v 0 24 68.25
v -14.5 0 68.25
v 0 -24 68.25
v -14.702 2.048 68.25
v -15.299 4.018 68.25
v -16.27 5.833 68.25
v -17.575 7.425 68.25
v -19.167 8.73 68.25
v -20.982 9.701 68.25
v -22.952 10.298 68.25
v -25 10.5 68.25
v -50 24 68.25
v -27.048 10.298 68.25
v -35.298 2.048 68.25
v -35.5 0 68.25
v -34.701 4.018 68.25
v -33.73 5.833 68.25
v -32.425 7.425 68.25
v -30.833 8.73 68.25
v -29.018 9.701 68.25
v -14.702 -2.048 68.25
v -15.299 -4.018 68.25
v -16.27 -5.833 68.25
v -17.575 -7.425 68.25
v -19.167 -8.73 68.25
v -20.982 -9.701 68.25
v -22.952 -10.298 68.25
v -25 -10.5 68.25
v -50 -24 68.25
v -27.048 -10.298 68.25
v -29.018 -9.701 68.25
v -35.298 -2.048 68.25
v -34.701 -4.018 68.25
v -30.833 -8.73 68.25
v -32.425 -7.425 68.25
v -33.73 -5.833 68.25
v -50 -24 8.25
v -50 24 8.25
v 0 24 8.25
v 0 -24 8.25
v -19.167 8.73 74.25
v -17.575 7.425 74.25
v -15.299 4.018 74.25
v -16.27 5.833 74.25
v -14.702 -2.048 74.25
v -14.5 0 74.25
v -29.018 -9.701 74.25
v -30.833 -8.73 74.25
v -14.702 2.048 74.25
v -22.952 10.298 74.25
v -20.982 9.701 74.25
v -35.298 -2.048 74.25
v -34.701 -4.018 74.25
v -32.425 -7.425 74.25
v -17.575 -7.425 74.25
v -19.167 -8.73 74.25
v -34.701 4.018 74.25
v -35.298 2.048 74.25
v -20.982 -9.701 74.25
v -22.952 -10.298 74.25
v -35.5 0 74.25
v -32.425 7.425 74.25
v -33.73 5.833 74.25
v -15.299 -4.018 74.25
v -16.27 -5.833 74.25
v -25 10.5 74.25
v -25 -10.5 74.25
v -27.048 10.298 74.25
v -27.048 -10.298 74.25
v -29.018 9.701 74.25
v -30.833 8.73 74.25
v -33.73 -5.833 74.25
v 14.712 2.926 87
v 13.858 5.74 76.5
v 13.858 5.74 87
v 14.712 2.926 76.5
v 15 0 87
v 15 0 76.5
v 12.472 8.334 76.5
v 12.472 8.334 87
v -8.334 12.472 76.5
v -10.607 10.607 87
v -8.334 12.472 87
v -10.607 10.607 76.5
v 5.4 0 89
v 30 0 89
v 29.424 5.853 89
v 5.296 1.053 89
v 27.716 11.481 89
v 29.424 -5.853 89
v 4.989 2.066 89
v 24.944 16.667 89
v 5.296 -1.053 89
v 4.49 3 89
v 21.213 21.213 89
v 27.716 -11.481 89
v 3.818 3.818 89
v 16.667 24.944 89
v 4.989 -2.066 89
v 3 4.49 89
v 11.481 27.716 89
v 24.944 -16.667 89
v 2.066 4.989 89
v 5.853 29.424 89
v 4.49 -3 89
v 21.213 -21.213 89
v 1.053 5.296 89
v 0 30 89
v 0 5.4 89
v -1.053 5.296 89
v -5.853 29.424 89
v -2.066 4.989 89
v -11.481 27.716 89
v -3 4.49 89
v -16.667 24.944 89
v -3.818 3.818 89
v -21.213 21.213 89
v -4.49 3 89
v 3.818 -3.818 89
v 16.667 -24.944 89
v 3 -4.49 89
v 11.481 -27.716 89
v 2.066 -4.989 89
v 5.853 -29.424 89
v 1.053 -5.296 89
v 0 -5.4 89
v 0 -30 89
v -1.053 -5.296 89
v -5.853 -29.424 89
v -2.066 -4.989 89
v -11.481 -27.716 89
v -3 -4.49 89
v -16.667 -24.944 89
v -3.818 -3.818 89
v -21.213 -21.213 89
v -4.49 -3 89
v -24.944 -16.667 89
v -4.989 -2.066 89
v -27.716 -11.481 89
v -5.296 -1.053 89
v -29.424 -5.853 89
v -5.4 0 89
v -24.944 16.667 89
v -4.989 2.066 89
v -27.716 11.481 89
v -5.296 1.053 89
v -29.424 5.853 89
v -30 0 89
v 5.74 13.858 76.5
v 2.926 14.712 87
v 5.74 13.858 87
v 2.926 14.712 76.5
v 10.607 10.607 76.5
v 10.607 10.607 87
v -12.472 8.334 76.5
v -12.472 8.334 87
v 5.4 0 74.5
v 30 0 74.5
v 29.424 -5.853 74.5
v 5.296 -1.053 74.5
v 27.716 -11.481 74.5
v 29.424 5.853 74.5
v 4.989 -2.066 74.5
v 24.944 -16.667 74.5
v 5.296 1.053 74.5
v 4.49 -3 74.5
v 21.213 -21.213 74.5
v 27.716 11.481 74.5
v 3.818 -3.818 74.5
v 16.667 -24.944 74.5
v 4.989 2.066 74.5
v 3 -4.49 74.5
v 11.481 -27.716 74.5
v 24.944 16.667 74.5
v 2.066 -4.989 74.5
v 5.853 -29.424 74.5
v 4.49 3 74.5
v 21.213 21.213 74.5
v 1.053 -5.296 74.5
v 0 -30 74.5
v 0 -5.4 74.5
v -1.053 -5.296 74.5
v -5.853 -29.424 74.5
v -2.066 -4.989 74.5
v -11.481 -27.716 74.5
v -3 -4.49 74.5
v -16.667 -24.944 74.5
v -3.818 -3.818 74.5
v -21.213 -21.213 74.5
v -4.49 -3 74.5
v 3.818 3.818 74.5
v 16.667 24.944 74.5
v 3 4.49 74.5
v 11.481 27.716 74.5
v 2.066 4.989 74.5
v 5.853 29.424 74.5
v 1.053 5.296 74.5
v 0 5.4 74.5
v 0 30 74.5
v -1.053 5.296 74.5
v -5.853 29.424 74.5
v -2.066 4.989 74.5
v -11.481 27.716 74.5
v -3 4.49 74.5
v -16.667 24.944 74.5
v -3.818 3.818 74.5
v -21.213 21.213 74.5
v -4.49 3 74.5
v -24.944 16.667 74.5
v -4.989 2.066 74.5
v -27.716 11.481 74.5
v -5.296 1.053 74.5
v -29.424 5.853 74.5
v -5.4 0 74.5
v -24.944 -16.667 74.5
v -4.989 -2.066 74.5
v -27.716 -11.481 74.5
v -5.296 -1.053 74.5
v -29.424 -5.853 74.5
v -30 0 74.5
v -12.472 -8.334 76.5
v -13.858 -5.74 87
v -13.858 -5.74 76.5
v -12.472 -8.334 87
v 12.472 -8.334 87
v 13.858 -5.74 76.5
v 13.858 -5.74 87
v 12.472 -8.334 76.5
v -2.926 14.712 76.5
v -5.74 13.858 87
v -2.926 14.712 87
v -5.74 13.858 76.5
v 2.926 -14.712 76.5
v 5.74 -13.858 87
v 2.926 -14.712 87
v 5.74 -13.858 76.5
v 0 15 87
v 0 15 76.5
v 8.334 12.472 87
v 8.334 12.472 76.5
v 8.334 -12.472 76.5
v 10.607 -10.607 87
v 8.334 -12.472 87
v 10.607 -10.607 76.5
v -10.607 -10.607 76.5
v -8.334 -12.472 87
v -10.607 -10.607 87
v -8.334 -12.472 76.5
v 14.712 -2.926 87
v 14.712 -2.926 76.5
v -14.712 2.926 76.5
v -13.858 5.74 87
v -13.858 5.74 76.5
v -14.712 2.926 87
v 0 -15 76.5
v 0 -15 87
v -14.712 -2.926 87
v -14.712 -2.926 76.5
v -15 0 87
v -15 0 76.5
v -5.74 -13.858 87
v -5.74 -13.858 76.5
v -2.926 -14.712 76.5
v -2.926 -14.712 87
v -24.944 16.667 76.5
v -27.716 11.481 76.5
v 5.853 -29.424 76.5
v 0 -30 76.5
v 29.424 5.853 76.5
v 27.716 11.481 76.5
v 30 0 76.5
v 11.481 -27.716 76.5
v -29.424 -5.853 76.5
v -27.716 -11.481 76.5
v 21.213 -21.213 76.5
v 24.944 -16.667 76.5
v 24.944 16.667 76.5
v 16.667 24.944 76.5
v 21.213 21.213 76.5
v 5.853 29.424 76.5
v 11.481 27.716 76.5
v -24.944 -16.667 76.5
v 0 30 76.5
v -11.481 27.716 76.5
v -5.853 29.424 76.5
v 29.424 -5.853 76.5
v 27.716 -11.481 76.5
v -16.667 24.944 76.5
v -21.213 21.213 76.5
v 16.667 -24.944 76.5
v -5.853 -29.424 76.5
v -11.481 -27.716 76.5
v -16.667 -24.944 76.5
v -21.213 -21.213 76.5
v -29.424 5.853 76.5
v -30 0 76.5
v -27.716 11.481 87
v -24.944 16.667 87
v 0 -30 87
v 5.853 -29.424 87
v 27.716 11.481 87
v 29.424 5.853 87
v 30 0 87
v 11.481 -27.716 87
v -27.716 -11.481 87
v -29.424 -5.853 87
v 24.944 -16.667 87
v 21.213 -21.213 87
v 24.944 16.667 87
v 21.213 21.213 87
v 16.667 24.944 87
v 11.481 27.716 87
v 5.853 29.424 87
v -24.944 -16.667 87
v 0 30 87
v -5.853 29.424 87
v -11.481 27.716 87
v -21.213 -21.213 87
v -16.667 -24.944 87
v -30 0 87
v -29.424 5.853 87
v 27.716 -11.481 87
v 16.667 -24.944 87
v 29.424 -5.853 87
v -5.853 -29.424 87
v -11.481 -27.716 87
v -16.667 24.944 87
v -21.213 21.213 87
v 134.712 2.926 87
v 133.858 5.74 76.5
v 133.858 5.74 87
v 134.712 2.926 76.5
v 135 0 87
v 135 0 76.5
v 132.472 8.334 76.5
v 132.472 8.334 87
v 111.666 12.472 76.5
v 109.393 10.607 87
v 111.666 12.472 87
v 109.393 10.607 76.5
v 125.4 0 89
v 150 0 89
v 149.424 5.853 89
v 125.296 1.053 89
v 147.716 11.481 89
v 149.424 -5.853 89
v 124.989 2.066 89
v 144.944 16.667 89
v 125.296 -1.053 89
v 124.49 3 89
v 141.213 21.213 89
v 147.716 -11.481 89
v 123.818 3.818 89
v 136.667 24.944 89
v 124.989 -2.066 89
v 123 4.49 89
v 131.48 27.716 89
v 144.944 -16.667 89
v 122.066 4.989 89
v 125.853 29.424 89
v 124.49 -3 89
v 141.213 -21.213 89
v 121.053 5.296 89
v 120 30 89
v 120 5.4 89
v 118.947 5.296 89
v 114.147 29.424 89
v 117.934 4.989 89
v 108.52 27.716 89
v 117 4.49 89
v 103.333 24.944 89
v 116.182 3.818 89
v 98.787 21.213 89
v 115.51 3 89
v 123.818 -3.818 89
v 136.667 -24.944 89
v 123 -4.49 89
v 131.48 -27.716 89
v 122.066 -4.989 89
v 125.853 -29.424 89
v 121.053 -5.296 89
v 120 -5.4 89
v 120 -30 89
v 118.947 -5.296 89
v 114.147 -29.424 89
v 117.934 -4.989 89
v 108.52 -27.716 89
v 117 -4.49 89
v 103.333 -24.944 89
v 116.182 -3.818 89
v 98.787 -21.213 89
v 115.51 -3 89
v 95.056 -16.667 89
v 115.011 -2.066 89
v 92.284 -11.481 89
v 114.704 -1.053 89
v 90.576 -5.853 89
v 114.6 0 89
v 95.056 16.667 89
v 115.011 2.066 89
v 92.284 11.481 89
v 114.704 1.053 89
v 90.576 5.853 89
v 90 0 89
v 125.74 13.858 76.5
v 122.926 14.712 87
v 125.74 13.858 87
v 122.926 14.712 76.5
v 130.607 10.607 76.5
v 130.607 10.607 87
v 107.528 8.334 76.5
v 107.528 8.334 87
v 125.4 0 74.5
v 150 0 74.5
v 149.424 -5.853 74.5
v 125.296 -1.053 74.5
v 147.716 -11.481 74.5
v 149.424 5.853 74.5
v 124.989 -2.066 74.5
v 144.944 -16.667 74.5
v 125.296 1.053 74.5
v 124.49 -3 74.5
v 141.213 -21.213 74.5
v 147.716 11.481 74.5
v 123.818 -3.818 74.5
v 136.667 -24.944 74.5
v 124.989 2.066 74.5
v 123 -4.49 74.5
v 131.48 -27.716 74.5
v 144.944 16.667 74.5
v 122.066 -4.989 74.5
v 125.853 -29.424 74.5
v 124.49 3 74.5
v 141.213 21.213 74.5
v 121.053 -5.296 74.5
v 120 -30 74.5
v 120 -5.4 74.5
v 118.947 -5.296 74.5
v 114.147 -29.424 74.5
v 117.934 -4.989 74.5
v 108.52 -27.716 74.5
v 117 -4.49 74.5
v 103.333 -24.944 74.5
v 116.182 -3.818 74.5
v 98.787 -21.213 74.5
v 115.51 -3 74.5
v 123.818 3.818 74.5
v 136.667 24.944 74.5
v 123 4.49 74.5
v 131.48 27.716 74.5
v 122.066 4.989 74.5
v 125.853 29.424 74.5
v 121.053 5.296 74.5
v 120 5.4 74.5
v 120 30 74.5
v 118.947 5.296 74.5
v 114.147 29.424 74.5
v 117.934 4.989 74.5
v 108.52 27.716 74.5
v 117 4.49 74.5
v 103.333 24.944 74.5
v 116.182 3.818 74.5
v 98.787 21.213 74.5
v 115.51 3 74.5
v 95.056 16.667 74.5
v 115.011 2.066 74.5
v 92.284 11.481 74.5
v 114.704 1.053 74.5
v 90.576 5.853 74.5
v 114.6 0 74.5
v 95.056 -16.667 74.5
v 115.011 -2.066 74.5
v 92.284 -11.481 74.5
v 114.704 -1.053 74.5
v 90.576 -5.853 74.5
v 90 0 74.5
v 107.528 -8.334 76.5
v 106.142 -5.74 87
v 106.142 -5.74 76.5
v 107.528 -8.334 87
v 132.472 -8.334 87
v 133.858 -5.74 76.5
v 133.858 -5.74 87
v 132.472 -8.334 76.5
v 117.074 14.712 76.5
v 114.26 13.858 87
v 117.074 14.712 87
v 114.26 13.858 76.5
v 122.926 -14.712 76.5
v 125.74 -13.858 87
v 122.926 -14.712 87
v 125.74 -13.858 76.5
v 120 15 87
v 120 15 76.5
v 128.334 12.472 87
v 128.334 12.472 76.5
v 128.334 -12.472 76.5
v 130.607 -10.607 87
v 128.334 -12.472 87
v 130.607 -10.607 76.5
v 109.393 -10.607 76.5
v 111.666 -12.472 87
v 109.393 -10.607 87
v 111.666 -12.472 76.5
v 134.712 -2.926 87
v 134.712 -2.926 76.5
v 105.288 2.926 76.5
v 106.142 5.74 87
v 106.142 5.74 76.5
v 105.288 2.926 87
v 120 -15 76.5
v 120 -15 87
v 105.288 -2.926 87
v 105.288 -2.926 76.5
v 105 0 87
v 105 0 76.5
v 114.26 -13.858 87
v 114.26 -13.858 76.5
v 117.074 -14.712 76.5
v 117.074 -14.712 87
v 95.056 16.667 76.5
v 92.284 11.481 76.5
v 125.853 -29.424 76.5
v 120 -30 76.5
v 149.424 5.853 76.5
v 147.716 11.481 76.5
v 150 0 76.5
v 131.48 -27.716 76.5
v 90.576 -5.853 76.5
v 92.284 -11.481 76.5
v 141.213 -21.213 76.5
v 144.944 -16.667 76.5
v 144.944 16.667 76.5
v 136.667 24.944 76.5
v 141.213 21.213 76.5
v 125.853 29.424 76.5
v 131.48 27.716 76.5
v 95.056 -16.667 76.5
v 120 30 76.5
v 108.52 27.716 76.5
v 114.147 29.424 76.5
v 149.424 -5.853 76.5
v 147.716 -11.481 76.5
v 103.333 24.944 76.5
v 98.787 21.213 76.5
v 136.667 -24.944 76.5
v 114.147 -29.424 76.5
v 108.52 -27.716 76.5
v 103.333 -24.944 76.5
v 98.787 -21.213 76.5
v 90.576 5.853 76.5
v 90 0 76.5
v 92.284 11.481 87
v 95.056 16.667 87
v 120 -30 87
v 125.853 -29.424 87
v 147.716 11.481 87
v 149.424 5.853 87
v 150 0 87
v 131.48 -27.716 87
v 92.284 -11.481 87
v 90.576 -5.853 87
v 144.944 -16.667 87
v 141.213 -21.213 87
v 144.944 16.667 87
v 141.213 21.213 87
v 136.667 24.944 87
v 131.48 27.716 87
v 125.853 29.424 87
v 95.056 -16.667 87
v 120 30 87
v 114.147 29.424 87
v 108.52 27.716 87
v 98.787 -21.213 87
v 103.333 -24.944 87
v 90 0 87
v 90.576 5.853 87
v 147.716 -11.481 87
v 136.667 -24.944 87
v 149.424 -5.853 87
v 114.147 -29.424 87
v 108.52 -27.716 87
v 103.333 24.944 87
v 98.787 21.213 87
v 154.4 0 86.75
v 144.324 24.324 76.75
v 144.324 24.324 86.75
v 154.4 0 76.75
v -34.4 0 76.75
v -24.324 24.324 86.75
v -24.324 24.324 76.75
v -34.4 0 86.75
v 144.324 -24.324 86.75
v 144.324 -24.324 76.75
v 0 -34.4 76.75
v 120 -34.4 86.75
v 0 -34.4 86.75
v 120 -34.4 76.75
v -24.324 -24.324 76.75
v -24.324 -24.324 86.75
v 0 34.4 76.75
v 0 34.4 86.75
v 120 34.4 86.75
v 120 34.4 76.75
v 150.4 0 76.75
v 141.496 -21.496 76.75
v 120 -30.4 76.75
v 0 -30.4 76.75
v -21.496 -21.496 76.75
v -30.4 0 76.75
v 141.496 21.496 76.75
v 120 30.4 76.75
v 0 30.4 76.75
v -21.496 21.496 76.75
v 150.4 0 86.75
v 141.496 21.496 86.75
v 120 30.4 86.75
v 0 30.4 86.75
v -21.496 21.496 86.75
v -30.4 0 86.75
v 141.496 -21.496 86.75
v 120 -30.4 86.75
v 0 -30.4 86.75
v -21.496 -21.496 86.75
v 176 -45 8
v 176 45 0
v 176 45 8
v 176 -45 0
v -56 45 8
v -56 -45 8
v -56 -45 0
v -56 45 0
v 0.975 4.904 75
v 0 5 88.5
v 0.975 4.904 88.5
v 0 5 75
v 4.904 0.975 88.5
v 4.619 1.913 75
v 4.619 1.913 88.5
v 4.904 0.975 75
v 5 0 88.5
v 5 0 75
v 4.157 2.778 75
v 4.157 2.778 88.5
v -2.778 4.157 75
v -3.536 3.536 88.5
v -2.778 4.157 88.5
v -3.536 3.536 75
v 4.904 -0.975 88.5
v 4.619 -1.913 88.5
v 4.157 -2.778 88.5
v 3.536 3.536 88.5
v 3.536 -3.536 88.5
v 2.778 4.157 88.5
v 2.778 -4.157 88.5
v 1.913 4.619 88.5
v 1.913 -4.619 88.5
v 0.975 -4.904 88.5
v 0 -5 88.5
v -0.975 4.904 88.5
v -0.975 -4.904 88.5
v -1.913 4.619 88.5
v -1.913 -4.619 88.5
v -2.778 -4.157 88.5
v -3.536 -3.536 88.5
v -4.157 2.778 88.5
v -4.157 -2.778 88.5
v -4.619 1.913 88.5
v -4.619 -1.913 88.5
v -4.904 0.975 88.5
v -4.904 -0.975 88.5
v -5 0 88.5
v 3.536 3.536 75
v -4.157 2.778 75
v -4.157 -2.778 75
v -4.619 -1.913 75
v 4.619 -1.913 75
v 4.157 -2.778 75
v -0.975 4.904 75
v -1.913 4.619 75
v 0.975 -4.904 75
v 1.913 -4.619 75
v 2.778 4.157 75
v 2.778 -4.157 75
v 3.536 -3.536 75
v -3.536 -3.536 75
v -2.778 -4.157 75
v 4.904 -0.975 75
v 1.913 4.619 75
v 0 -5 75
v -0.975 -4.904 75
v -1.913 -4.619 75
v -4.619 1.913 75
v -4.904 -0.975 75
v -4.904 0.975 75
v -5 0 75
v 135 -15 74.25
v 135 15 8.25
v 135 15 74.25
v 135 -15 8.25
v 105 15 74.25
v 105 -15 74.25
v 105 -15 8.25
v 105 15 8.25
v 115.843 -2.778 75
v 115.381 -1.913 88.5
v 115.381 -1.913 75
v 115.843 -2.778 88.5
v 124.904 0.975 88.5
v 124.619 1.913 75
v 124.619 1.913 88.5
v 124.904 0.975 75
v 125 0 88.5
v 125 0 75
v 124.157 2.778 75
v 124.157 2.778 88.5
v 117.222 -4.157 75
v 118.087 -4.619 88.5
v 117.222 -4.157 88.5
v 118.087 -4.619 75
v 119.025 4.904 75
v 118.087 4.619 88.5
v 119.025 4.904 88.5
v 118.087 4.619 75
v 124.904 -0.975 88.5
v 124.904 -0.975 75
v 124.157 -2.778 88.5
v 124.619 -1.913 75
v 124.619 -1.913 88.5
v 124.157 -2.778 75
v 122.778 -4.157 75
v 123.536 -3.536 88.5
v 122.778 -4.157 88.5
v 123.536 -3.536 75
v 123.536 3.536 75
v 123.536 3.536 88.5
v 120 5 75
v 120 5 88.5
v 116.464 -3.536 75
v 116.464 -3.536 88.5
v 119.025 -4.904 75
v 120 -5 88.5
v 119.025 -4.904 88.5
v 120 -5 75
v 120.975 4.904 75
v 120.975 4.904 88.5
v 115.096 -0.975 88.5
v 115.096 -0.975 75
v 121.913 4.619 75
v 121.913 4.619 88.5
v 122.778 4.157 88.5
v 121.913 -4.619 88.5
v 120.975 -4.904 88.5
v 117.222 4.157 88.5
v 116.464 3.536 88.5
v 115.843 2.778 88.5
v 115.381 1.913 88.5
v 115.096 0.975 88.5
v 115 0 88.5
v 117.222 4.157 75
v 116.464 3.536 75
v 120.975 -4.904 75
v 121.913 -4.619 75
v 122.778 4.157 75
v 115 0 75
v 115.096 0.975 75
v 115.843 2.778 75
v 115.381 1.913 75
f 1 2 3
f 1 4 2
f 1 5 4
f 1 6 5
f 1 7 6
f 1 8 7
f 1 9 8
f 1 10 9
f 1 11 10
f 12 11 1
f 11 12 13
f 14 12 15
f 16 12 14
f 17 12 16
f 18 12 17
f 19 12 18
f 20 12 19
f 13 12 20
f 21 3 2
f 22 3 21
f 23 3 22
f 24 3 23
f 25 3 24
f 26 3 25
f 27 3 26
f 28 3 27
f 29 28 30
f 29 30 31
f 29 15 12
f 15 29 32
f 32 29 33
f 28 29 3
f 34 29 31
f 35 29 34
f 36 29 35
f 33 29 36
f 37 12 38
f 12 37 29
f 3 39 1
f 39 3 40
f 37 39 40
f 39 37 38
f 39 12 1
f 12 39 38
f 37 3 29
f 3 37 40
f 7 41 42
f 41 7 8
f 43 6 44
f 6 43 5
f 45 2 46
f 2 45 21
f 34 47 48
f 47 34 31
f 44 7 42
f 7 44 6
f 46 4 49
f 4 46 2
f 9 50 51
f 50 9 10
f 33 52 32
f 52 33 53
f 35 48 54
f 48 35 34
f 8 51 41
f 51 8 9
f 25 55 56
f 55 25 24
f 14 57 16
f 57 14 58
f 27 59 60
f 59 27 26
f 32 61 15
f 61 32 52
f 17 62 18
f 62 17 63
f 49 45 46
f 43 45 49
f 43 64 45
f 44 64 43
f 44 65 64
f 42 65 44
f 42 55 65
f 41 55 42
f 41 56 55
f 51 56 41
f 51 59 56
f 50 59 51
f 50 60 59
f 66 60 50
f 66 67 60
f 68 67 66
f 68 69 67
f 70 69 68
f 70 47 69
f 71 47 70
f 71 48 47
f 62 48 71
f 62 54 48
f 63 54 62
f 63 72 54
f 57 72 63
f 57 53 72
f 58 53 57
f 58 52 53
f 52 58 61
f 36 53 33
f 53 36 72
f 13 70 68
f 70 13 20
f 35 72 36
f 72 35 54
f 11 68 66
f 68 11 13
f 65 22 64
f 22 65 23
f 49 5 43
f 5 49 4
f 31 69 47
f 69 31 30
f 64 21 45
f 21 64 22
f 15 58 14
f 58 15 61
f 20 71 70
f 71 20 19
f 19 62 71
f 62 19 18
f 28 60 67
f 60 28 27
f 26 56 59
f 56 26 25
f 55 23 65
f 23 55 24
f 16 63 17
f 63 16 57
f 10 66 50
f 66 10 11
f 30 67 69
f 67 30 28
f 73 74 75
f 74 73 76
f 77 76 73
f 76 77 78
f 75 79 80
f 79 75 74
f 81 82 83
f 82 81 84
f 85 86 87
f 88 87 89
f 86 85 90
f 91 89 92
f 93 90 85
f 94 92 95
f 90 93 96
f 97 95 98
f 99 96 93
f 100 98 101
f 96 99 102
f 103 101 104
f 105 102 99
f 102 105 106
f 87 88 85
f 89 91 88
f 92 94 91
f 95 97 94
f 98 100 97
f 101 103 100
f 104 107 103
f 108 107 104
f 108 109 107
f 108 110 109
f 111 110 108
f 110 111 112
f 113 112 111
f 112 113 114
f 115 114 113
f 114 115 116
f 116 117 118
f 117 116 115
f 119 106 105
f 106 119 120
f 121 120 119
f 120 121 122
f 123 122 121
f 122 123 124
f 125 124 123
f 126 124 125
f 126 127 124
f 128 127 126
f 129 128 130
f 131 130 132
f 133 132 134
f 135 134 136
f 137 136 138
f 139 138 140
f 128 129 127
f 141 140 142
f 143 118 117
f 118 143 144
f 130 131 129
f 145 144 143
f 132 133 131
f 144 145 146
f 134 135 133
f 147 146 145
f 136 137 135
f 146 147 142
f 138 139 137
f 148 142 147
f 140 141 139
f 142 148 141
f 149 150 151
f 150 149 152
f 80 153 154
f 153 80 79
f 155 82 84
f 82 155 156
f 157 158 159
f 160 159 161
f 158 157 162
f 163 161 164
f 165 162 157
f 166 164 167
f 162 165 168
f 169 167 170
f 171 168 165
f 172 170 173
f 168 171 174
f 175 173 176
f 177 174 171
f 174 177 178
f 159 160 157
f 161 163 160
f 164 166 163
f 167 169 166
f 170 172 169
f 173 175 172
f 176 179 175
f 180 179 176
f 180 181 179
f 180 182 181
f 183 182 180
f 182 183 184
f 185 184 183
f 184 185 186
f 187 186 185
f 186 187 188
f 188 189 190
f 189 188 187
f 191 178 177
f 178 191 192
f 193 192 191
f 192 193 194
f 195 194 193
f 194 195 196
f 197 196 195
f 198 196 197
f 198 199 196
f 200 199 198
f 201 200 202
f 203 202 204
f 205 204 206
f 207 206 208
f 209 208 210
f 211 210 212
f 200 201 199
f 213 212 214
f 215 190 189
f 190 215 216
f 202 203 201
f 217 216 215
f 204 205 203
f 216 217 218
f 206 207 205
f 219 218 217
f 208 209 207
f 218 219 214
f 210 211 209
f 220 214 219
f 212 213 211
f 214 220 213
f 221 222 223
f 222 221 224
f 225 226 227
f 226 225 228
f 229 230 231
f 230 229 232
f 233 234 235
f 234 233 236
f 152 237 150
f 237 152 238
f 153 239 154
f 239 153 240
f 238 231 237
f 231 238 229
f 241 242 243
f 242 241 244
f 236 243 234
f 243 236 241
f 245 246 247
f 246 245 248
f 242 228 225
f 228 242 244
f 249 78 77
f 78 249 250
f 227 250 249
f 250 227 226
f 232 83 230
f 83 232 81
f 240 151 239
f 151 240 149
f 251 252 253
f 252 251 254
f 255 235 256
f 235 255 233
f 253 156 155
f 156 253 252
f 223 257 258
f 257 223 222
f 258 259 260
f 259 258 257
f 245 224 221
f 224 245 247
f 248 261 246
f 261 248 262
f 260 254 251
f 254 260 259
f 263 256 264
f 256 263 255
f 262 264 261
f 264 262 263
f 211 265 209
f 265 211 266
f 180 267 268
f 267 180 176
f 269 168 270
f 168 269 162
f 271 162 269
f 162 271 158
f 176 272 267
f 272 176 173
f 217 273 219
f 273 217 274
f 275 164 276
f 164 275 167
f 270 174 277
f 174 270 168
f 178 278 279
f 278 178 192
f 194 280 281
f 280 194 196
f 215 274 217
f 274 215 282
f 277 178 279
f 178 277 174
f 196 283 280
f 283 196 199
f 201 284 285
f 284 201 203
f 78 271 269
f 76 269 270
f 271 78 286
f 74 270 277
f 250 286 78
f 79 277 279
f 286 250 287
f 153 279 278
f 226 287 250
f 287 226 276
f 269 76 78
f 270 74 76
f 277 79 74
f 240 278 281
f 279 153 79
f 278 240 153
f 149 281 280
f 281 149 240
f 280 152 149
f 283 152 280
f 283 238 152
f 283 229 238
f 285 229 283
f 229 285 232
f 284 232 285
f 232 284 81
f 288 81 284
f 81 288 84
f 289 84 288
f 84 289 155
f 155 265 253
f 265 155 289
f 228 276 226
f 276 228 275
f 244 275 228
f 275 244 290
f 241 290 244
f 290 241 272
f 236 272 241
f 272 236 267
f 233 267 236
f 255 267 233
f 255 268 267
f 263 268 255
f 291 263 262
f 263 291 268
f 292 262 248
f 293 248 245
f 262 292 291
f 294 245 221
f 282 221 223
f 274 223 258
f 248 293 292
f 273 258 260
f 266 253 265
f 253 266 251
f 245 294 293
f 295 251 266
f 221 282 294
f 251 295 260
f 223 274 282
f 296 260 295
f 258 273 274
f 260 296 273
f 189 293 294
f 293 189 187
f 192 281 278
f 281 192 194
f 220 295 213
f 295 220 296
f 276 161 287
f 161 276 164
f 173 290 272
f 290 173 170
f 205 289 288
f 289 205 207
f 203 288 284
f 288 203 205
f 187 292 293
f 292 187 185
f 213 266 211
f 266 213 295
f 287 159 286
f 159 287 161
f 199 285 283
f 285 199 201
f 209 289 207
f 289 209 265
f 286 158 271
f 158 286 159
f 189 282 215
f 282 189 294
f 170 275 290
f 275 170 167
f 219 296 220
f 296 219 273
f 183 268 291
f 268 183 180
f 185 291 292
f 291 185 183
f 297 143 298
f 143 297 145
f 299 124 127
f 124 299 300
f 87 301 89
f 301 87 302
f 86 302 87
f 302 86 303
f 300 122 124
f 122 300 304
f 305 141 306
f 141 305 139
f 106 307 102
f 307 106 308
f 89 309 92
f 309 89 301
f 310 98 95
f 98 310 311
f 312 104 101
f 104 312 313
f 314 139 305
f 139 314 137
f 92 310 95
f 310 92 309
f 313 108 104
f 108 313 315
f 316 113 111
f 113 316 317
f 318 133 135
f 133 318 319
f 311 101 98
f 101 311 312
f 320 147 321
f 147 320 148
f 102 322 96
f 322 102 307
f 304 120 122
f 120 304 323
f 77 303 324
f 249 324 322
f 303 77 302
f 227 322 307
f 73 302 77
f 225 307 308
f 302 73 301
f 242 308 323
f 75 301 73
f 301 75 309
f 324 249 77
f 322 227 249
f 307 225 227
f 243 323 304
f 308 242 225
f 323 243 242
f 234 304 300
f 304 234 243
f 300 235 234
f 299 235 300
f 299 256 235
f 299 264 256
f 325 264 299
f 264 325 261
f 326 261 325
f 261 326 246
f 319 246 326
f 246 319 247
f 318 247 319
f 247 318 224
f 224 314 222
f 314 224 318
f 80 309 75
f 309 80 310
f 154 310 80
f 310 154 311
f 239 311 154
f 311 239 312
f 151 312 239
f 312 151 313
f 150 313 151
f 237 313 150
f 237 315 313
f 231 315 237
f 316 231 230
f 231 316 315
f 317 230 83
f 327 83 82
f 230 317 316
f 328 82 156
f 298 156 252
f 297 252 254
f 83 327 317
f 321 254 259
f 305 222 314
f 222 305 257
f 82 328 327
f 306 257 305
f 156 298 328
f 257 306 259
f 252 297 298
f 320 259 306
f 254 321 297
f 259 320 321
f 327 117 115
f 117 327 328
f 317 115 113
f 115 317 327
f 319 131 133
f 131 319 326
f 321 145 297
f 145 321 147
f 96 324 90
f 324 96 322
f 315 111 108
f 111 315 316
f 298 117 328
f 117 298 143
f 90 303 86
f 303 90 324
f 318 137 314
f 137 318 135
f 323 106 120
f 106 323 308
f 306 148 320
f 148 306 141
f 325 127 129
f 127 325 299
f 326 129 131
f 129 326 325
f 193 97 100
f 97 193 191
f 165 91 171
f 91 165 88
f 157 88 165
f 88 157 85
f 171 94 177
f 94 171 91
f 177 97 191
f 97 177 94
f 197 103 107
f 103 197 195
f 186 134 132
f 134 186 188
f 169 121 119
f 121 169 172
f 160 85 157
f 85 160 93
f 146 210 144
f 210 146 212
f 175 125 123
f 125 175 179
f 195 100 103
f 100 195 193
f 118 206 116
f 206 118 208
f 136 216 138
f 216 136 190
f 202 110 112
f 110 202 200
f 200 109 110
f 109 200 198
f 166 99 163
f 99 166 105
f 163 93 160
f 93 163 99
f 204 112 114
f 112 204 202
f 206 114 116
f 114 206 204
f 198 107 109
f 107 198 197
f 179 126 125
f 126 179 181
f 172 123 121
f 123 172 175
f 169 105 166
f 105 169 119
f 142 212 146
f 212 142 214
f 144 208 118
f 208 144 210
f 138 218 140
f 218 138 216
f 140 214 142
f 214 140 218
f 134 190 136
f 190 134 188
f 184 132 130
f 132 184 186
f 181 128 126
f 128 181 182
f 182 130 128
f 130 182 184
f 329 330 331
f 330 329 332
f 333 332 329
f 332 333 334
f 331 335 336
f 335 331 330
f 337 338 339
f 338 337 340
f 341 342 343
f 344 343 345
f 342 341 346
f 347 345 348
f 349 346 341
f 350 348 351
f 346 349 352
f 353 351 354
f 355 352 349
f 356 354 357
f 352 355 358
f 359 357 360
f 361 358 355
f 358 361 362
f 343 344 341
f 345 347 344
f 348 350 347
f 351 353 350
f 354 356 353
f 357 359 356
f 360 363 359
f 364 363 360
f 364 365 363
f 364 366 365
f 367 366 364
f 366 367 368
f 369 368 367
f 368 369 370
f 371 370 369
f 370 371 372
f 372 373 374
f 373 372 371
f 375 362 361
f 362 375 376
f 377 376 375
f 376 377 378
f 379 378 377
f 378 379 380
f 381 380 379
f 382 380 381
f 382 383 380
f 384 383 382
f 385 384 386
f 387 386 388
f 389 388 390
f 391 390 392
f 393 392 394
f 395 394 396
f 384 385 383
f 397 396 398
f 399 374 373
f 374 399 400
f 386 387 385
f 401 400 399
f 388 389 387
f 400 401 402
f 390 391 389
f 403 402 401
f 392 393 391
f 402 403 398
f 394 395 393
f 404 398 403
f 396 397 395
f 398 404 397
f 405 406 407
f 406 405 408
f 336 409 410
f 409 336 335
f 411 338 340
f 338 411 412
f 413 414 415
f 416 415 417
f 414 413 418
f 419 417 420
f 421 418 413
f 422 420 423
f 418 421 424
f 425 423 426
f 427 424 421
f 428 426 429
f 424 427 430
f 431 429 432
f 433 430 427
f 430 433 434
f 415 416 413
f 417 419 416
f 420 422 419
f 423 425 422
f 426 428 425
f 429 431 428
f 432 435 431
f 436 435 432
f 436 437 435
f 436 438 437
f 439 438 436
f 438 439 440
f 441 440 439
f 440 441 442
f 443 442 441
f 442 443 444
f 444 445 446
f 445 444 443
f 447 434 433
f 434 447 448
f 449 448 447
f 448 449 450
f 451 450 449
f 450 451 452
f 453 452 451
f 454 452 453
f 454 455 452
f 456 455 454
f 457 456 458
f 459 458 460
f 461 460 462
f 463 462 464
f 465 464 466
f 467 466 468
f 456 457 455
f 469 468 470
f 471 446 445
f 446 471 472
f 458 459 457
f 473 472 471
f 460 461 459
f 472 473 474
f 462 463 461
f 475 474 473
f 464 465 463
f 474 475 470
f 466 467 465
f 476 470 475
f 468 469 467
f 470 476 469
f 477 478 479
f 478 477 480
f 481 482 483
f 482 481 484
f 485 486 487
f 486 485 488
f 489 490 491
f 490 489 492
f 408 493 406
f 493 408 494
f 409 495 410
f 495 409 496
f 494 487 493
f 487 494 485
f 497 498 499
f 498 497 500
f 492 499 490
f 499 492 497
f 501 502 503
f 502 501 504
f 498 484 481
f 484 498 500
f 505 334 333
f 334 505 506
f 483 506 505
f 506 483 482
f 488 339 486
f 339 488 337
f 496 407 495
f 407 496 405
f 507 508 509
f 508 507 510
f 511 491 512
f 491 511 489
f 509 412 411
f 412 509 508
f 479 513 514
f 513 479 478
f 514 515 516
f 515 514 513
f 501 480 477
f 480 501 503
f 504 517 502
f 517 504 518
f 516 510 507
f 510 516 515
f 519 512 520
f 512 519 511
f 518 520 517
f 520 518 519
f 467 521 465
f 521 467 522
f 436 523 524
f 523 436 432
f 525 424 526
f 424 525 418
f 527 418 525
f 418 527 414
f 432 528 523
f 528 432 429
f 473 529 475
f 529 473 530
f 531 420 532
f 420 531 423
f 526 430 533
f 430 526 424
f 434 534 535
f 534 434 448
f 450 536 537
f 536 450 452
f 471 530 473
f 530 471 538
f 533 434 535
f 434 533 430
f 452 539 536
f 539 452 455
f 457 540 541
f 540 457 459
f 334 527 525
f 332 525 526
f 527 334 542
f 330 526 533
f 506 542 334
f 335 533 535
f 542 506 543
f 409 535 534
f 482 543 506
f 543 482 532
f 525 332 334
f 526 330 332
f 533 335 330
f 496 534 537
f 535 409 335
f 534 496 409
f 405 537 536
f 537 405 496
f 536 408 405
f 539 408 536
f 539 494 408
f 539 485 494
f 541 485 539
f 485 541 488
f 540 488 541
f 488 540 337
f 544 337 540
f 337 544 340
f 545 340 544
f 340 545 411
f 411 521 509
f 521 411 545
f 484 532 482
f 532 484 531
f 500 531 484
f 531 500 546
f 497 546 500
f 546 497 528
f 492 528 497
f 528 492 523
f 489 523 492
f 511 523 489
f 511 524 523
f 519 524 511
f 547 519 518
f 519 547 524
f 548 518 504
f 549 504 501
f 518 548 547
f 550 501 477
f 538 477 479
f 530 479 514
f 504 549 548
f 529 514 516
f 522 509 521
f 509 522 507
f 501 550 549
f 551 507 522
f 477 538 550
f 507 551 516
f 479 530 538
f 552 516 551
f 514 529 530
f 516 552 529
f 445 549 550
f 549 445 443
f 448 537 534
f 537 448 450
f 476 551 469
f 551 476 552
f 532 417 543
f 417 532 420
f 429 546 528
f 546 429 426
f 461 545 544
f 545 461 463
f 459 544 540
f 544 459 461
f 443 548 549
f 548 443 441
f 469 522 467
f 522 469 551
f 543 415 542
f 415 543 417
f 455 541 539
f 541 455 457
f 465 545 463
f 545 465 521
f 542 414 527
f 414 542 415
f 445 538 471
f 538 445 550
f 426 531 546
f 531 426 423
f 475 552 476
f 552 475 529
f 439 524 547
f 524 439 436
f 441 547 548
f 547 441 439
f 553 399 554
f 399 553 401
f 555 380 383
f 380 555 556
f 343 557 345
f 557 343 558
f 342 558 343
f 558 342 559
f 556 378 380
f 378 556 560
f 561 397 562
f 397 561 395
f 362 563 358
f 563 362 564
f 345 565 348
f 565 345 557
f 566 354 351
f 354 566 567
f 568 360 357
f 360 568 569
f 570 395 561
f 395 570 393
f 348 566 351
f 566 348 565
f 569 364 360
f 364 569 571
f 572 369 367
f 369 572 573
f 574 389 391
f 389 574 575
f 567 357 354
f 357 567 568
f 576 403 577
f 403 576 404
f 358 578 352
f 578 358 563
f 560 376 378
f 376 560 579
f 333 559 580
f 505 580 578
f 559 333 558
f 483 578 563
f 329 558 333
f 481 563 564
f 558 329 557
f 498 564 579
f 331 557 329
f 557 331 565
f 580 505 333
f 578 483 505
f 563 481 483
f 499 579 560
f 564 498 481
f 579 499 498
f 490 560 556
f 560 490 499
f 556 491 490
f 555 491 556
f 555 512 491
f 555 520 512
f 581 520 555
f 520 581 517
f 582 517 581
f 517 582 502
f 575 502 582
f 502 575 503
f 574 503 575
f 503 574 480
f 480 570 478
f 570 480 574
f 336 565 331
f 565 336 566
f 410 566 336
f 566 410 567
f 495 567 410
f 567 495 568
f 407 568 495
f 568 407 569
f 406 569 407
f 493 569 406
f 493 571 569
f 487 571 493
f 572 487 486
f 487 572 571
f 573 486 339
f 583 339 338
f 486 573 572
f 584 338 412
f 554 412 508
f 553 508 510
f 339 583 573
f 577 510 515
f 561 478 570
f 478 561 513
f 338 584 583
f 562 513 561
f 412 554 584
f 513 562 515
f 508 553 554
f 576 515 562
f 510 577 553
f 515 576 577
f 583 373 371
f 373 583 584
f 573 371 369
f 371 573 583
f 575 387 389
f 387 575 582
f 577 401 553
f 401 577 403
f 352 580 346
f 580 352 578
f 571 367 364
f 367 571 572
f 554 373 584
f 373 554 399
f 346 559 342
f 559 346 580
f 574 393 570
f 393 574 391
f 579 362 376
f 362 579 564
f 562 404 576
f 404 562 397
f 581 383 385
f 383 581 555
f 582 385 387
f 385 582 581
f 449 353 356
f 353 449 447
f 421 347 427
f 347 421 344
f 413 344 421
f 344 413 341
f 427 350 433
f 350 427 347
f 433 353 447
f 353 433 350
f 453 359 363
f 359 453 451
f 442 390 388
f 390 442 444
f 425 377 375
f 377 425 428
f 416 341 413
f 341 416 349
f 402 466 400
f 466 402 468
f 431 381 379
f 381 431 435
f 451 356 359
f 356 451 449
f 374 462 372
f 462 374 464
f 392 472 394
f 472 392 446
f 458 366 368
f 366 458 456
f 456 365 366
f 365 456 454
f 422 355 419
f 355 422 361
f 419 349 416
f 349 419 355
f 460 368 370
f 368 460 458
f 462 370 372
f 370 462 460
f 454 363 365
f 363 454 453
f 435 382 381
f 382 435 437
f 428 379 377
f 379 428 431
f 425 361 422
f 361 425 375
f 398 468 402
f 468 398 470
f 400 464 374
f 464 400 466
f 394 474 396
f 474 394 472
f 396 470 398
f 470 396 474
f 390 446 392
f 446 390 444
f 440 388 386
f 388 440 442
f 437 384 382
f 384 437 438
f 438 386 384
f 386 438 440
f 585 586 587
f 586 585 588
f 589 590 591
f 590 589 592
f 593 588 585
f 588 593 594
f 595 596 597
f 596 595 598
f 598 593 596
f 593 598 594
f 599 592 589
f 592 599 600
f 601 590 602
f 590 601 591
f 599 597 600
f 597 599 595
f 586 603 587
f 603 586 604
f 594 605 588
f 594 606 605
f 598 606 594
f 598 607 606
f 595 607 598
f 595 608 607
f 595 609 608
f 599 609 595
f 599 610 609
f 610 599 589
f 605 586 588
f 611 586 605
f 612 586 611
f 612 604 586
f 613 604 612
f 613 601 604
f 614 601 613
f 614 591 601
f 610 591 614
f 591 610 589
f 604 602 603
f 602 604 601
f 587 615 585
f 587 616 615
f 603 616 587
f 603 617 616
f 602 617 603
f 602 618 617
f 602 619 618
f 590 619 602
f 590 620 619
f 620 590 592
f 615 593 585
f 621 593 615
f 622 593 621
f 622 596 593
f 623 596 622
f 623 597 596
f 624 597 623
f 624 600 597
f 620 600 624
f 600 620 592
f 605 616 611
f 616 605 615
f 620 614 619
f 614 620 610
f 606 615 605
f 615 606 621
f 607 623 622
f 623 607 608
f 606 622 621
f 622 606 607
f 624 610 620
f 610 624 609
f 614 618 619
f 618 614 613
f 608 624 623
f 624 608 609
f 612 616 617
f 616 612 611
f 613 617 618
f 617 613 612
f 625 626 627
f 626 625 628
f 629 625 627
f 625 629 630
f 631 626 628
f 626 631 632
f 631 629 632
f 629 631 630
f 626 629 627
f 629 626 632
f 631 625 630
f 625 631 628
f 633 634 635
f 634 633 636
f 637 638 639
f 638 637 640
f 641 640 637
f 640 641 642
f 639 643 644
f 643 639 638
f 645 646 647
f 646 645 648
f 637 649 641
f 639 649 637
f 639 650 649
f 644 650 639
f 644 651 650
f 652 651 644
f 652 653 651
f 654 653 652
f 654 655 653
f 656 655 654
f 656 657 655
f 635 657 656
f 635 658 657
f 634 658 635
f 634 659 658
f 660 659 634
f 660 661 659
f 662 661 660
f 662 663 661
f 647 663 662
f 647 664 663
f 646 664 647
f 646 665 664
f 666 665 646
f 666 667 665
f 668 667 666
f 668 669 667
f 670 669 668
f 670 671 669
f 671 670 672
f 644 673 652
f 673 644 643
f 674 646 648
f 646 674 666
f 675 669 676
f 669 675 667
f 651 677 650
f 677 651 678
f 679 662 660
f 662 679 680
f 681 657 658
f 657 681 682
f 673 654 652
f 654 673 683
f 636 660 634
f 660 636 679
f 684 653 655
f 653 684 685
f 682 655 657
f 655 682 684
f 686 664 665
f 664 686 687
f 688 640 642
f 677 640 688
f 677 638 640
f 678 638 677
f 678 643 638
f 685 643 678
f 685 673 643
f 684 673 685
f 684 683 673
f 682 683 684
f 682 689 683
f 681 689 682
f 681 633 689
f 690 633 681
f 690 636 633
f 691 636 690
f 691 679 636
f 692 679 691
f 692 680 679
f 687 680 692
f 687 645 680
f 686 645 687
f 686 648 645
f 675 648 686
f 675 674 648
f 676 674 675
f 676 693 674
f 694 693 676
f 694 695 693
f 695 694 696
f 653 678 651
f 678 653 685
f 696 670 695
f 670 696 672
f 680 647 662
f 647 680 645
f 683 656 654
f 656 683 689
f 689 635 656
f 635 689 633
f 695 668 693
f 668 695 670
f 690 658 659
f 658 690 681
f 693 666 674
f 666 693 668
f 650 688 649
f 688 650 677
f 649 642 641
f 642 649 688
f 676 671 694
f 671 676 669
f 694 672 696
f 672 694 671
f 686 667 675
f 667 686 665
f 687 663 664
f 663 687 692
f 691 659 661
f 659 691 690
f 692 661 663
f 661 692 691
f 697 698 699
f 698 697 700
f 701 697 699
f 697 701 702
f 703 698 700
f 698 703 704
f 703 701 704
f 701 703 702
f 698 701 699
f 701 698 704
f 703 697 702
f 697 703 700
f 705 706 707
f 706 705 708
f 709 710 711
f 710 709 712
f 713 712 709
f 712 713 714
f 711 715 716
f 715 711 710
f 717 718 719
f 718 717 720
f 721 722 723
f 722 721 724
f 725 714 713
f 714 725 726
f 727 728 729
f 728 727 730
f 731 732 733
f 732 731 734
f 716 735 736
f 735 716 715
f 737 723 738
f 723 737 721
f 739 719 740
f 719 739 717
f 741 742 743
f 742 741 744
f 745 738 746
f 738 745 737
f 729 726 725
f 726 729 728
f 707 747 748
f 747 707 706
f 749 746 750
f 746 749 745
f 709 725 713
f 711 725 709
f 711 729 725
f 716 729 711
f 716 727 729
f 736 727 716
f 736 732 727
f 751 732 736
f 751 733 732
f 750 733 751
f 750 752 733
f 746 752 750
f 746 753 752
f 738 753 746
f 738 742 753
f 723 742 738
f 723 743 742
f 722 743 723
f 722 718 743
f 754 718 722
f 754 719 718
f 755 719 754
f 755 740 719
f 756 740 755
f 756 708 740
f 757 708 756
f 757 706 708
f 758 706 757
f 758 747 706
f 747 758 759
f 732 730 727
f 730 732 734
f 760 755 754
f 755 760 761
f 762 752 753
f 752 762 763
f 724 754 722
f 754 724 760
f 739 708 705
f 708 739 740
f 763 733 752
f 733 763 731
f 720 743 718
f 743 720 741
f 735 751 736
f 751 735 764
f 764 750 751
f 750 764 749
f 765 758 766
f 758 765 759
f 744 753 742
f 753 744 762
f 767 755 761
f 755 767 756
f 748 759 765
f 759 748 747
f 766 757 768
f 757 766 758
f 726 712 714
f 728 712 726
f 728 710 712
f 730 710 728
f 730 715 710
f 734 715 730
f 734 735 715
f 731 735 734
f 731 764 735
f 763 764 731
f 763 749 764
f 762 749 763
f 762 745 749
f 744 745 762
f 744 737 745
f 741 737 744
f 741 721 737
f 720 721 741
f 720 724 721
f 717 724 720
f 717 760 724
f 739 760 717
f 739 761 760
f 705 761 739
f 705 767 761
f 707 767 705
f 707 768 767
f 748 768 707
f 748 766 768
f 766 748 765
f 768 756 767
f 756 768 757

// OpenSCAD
$fn = 32;

// ------------------------------------------------------------------------
// Motor belt drive: span 120 mm, pulleys d60, belt 10 mm wide
// Every part is its own module, assembly() places every instance.
// ------------------------------------------------------------------------

// --- part 1 ---
module base_plate() {
  difference() {
    translate([-116, -45, 0]) cube([232, 90, 8]);
  }
}

// --- part 2 ---
module motor() {
  union() {
    translate([-30, -24, 0]) cube([60, 48, 50]);
    translate([33, 0, 25]) rotate([0, 90, 0]) cylinder(h = 6, d = 21, center = true);
  }
}

// --- part 3 ---
module drive_shaft() {
  translate([0, 0, -6.75]) cylinder(h = 13.5, d = 10);
}

// --- part 4 ---
module pulley_drive() {
  difference() {
    union() {
      cylinder(h = 14.5, d = 30);
      cylinder(h = 2, d = 60);
      translate([0, 0, 12.5]) cylinder(h = 2, d = 60);
    }
    translate([0, 0, -1]) cylinder(h = 16.5, d = 10.8);
  }
}

// --- part 5 ---
module idler_post() {
  translate([-15, -15, 0]) cube([30, 30, 66]);
}

// --- part 6 ---
module driven_shaft() {
  translate([0, 0, -6.75]) cylinder(h = 13.5, d = 10);
}

// --- part 7 ---
module pulley_driven() {
  difference() {
    union() {
      cylinder(h = 14.5, d = 30);
      cylinder(h = 2, d = 60);
      translate([0, 0, 12.5]) cylinder(h = 2, d = 60);
    }
    translate([0, 0, -1]) cylinder(h = 16.5, d = 10.8);
  }
}

// --- part 8 ---
module drive_belt() {
  difference() {
    linear_extrude(height = 10) polygon(points = concat([for (a = [90 : 45 : 270]) [34.4 * cos(a), 34.4 * sin(a)]], [for (a = [270 : 45 : 450]) [120 + 34.4 * cos(a), 34.4 * sin(a)]]));
    translate([0, 0, -1]) linear_extrude(height = 12) polygon(points = concat([for (a = [90 : 45 : 270]) [30.4 * cos(a), 30.4 * sin(a)]], [for (a = [270 : 45 : 450]) [120 + 30.4 * cos(a), 30.4 * sin(a)]]));
  }
}

// --- assembly ---
module assembly() {
  color([0.80, 0.24, 0.20]) translate([60, 0, 0]) rotate([0, 0, 0]) base_plate();
  color([0.20, 0.45, 0.75]) translate([0, 0, 38.25]) rotate([0, 270, 0]) motor();
  color([0.25, 0.62, 0.32]) translate([0, 0, 81.75]) rotate([0, 0, 0]) drive_shaft();
  color([0.92, 0.70, 0.18]) translate([0, 0, 74.5]) rotate([0, 0, 0]) pulley_drive();
  color([0.58, 0.35, 0.70]) translate([120, 0, 8.25]) rotate([0, 0, 0]) idler_post();
  color([0.16, 0.66, 0.66]) translate([120, 0, 81.75]) rotate([0, 0, 0]) driven_shaft();
  color([0.85, 0.48, 0.18]) translate([120, 0, 74.5]) rotate([0, 0, 0]) pulley_driven();
  color([0.55, 0.60, 0.65]) translate([0, 0, 76.75]) rotate([0, 0, 0]) drive_belt();
}

assembly();
